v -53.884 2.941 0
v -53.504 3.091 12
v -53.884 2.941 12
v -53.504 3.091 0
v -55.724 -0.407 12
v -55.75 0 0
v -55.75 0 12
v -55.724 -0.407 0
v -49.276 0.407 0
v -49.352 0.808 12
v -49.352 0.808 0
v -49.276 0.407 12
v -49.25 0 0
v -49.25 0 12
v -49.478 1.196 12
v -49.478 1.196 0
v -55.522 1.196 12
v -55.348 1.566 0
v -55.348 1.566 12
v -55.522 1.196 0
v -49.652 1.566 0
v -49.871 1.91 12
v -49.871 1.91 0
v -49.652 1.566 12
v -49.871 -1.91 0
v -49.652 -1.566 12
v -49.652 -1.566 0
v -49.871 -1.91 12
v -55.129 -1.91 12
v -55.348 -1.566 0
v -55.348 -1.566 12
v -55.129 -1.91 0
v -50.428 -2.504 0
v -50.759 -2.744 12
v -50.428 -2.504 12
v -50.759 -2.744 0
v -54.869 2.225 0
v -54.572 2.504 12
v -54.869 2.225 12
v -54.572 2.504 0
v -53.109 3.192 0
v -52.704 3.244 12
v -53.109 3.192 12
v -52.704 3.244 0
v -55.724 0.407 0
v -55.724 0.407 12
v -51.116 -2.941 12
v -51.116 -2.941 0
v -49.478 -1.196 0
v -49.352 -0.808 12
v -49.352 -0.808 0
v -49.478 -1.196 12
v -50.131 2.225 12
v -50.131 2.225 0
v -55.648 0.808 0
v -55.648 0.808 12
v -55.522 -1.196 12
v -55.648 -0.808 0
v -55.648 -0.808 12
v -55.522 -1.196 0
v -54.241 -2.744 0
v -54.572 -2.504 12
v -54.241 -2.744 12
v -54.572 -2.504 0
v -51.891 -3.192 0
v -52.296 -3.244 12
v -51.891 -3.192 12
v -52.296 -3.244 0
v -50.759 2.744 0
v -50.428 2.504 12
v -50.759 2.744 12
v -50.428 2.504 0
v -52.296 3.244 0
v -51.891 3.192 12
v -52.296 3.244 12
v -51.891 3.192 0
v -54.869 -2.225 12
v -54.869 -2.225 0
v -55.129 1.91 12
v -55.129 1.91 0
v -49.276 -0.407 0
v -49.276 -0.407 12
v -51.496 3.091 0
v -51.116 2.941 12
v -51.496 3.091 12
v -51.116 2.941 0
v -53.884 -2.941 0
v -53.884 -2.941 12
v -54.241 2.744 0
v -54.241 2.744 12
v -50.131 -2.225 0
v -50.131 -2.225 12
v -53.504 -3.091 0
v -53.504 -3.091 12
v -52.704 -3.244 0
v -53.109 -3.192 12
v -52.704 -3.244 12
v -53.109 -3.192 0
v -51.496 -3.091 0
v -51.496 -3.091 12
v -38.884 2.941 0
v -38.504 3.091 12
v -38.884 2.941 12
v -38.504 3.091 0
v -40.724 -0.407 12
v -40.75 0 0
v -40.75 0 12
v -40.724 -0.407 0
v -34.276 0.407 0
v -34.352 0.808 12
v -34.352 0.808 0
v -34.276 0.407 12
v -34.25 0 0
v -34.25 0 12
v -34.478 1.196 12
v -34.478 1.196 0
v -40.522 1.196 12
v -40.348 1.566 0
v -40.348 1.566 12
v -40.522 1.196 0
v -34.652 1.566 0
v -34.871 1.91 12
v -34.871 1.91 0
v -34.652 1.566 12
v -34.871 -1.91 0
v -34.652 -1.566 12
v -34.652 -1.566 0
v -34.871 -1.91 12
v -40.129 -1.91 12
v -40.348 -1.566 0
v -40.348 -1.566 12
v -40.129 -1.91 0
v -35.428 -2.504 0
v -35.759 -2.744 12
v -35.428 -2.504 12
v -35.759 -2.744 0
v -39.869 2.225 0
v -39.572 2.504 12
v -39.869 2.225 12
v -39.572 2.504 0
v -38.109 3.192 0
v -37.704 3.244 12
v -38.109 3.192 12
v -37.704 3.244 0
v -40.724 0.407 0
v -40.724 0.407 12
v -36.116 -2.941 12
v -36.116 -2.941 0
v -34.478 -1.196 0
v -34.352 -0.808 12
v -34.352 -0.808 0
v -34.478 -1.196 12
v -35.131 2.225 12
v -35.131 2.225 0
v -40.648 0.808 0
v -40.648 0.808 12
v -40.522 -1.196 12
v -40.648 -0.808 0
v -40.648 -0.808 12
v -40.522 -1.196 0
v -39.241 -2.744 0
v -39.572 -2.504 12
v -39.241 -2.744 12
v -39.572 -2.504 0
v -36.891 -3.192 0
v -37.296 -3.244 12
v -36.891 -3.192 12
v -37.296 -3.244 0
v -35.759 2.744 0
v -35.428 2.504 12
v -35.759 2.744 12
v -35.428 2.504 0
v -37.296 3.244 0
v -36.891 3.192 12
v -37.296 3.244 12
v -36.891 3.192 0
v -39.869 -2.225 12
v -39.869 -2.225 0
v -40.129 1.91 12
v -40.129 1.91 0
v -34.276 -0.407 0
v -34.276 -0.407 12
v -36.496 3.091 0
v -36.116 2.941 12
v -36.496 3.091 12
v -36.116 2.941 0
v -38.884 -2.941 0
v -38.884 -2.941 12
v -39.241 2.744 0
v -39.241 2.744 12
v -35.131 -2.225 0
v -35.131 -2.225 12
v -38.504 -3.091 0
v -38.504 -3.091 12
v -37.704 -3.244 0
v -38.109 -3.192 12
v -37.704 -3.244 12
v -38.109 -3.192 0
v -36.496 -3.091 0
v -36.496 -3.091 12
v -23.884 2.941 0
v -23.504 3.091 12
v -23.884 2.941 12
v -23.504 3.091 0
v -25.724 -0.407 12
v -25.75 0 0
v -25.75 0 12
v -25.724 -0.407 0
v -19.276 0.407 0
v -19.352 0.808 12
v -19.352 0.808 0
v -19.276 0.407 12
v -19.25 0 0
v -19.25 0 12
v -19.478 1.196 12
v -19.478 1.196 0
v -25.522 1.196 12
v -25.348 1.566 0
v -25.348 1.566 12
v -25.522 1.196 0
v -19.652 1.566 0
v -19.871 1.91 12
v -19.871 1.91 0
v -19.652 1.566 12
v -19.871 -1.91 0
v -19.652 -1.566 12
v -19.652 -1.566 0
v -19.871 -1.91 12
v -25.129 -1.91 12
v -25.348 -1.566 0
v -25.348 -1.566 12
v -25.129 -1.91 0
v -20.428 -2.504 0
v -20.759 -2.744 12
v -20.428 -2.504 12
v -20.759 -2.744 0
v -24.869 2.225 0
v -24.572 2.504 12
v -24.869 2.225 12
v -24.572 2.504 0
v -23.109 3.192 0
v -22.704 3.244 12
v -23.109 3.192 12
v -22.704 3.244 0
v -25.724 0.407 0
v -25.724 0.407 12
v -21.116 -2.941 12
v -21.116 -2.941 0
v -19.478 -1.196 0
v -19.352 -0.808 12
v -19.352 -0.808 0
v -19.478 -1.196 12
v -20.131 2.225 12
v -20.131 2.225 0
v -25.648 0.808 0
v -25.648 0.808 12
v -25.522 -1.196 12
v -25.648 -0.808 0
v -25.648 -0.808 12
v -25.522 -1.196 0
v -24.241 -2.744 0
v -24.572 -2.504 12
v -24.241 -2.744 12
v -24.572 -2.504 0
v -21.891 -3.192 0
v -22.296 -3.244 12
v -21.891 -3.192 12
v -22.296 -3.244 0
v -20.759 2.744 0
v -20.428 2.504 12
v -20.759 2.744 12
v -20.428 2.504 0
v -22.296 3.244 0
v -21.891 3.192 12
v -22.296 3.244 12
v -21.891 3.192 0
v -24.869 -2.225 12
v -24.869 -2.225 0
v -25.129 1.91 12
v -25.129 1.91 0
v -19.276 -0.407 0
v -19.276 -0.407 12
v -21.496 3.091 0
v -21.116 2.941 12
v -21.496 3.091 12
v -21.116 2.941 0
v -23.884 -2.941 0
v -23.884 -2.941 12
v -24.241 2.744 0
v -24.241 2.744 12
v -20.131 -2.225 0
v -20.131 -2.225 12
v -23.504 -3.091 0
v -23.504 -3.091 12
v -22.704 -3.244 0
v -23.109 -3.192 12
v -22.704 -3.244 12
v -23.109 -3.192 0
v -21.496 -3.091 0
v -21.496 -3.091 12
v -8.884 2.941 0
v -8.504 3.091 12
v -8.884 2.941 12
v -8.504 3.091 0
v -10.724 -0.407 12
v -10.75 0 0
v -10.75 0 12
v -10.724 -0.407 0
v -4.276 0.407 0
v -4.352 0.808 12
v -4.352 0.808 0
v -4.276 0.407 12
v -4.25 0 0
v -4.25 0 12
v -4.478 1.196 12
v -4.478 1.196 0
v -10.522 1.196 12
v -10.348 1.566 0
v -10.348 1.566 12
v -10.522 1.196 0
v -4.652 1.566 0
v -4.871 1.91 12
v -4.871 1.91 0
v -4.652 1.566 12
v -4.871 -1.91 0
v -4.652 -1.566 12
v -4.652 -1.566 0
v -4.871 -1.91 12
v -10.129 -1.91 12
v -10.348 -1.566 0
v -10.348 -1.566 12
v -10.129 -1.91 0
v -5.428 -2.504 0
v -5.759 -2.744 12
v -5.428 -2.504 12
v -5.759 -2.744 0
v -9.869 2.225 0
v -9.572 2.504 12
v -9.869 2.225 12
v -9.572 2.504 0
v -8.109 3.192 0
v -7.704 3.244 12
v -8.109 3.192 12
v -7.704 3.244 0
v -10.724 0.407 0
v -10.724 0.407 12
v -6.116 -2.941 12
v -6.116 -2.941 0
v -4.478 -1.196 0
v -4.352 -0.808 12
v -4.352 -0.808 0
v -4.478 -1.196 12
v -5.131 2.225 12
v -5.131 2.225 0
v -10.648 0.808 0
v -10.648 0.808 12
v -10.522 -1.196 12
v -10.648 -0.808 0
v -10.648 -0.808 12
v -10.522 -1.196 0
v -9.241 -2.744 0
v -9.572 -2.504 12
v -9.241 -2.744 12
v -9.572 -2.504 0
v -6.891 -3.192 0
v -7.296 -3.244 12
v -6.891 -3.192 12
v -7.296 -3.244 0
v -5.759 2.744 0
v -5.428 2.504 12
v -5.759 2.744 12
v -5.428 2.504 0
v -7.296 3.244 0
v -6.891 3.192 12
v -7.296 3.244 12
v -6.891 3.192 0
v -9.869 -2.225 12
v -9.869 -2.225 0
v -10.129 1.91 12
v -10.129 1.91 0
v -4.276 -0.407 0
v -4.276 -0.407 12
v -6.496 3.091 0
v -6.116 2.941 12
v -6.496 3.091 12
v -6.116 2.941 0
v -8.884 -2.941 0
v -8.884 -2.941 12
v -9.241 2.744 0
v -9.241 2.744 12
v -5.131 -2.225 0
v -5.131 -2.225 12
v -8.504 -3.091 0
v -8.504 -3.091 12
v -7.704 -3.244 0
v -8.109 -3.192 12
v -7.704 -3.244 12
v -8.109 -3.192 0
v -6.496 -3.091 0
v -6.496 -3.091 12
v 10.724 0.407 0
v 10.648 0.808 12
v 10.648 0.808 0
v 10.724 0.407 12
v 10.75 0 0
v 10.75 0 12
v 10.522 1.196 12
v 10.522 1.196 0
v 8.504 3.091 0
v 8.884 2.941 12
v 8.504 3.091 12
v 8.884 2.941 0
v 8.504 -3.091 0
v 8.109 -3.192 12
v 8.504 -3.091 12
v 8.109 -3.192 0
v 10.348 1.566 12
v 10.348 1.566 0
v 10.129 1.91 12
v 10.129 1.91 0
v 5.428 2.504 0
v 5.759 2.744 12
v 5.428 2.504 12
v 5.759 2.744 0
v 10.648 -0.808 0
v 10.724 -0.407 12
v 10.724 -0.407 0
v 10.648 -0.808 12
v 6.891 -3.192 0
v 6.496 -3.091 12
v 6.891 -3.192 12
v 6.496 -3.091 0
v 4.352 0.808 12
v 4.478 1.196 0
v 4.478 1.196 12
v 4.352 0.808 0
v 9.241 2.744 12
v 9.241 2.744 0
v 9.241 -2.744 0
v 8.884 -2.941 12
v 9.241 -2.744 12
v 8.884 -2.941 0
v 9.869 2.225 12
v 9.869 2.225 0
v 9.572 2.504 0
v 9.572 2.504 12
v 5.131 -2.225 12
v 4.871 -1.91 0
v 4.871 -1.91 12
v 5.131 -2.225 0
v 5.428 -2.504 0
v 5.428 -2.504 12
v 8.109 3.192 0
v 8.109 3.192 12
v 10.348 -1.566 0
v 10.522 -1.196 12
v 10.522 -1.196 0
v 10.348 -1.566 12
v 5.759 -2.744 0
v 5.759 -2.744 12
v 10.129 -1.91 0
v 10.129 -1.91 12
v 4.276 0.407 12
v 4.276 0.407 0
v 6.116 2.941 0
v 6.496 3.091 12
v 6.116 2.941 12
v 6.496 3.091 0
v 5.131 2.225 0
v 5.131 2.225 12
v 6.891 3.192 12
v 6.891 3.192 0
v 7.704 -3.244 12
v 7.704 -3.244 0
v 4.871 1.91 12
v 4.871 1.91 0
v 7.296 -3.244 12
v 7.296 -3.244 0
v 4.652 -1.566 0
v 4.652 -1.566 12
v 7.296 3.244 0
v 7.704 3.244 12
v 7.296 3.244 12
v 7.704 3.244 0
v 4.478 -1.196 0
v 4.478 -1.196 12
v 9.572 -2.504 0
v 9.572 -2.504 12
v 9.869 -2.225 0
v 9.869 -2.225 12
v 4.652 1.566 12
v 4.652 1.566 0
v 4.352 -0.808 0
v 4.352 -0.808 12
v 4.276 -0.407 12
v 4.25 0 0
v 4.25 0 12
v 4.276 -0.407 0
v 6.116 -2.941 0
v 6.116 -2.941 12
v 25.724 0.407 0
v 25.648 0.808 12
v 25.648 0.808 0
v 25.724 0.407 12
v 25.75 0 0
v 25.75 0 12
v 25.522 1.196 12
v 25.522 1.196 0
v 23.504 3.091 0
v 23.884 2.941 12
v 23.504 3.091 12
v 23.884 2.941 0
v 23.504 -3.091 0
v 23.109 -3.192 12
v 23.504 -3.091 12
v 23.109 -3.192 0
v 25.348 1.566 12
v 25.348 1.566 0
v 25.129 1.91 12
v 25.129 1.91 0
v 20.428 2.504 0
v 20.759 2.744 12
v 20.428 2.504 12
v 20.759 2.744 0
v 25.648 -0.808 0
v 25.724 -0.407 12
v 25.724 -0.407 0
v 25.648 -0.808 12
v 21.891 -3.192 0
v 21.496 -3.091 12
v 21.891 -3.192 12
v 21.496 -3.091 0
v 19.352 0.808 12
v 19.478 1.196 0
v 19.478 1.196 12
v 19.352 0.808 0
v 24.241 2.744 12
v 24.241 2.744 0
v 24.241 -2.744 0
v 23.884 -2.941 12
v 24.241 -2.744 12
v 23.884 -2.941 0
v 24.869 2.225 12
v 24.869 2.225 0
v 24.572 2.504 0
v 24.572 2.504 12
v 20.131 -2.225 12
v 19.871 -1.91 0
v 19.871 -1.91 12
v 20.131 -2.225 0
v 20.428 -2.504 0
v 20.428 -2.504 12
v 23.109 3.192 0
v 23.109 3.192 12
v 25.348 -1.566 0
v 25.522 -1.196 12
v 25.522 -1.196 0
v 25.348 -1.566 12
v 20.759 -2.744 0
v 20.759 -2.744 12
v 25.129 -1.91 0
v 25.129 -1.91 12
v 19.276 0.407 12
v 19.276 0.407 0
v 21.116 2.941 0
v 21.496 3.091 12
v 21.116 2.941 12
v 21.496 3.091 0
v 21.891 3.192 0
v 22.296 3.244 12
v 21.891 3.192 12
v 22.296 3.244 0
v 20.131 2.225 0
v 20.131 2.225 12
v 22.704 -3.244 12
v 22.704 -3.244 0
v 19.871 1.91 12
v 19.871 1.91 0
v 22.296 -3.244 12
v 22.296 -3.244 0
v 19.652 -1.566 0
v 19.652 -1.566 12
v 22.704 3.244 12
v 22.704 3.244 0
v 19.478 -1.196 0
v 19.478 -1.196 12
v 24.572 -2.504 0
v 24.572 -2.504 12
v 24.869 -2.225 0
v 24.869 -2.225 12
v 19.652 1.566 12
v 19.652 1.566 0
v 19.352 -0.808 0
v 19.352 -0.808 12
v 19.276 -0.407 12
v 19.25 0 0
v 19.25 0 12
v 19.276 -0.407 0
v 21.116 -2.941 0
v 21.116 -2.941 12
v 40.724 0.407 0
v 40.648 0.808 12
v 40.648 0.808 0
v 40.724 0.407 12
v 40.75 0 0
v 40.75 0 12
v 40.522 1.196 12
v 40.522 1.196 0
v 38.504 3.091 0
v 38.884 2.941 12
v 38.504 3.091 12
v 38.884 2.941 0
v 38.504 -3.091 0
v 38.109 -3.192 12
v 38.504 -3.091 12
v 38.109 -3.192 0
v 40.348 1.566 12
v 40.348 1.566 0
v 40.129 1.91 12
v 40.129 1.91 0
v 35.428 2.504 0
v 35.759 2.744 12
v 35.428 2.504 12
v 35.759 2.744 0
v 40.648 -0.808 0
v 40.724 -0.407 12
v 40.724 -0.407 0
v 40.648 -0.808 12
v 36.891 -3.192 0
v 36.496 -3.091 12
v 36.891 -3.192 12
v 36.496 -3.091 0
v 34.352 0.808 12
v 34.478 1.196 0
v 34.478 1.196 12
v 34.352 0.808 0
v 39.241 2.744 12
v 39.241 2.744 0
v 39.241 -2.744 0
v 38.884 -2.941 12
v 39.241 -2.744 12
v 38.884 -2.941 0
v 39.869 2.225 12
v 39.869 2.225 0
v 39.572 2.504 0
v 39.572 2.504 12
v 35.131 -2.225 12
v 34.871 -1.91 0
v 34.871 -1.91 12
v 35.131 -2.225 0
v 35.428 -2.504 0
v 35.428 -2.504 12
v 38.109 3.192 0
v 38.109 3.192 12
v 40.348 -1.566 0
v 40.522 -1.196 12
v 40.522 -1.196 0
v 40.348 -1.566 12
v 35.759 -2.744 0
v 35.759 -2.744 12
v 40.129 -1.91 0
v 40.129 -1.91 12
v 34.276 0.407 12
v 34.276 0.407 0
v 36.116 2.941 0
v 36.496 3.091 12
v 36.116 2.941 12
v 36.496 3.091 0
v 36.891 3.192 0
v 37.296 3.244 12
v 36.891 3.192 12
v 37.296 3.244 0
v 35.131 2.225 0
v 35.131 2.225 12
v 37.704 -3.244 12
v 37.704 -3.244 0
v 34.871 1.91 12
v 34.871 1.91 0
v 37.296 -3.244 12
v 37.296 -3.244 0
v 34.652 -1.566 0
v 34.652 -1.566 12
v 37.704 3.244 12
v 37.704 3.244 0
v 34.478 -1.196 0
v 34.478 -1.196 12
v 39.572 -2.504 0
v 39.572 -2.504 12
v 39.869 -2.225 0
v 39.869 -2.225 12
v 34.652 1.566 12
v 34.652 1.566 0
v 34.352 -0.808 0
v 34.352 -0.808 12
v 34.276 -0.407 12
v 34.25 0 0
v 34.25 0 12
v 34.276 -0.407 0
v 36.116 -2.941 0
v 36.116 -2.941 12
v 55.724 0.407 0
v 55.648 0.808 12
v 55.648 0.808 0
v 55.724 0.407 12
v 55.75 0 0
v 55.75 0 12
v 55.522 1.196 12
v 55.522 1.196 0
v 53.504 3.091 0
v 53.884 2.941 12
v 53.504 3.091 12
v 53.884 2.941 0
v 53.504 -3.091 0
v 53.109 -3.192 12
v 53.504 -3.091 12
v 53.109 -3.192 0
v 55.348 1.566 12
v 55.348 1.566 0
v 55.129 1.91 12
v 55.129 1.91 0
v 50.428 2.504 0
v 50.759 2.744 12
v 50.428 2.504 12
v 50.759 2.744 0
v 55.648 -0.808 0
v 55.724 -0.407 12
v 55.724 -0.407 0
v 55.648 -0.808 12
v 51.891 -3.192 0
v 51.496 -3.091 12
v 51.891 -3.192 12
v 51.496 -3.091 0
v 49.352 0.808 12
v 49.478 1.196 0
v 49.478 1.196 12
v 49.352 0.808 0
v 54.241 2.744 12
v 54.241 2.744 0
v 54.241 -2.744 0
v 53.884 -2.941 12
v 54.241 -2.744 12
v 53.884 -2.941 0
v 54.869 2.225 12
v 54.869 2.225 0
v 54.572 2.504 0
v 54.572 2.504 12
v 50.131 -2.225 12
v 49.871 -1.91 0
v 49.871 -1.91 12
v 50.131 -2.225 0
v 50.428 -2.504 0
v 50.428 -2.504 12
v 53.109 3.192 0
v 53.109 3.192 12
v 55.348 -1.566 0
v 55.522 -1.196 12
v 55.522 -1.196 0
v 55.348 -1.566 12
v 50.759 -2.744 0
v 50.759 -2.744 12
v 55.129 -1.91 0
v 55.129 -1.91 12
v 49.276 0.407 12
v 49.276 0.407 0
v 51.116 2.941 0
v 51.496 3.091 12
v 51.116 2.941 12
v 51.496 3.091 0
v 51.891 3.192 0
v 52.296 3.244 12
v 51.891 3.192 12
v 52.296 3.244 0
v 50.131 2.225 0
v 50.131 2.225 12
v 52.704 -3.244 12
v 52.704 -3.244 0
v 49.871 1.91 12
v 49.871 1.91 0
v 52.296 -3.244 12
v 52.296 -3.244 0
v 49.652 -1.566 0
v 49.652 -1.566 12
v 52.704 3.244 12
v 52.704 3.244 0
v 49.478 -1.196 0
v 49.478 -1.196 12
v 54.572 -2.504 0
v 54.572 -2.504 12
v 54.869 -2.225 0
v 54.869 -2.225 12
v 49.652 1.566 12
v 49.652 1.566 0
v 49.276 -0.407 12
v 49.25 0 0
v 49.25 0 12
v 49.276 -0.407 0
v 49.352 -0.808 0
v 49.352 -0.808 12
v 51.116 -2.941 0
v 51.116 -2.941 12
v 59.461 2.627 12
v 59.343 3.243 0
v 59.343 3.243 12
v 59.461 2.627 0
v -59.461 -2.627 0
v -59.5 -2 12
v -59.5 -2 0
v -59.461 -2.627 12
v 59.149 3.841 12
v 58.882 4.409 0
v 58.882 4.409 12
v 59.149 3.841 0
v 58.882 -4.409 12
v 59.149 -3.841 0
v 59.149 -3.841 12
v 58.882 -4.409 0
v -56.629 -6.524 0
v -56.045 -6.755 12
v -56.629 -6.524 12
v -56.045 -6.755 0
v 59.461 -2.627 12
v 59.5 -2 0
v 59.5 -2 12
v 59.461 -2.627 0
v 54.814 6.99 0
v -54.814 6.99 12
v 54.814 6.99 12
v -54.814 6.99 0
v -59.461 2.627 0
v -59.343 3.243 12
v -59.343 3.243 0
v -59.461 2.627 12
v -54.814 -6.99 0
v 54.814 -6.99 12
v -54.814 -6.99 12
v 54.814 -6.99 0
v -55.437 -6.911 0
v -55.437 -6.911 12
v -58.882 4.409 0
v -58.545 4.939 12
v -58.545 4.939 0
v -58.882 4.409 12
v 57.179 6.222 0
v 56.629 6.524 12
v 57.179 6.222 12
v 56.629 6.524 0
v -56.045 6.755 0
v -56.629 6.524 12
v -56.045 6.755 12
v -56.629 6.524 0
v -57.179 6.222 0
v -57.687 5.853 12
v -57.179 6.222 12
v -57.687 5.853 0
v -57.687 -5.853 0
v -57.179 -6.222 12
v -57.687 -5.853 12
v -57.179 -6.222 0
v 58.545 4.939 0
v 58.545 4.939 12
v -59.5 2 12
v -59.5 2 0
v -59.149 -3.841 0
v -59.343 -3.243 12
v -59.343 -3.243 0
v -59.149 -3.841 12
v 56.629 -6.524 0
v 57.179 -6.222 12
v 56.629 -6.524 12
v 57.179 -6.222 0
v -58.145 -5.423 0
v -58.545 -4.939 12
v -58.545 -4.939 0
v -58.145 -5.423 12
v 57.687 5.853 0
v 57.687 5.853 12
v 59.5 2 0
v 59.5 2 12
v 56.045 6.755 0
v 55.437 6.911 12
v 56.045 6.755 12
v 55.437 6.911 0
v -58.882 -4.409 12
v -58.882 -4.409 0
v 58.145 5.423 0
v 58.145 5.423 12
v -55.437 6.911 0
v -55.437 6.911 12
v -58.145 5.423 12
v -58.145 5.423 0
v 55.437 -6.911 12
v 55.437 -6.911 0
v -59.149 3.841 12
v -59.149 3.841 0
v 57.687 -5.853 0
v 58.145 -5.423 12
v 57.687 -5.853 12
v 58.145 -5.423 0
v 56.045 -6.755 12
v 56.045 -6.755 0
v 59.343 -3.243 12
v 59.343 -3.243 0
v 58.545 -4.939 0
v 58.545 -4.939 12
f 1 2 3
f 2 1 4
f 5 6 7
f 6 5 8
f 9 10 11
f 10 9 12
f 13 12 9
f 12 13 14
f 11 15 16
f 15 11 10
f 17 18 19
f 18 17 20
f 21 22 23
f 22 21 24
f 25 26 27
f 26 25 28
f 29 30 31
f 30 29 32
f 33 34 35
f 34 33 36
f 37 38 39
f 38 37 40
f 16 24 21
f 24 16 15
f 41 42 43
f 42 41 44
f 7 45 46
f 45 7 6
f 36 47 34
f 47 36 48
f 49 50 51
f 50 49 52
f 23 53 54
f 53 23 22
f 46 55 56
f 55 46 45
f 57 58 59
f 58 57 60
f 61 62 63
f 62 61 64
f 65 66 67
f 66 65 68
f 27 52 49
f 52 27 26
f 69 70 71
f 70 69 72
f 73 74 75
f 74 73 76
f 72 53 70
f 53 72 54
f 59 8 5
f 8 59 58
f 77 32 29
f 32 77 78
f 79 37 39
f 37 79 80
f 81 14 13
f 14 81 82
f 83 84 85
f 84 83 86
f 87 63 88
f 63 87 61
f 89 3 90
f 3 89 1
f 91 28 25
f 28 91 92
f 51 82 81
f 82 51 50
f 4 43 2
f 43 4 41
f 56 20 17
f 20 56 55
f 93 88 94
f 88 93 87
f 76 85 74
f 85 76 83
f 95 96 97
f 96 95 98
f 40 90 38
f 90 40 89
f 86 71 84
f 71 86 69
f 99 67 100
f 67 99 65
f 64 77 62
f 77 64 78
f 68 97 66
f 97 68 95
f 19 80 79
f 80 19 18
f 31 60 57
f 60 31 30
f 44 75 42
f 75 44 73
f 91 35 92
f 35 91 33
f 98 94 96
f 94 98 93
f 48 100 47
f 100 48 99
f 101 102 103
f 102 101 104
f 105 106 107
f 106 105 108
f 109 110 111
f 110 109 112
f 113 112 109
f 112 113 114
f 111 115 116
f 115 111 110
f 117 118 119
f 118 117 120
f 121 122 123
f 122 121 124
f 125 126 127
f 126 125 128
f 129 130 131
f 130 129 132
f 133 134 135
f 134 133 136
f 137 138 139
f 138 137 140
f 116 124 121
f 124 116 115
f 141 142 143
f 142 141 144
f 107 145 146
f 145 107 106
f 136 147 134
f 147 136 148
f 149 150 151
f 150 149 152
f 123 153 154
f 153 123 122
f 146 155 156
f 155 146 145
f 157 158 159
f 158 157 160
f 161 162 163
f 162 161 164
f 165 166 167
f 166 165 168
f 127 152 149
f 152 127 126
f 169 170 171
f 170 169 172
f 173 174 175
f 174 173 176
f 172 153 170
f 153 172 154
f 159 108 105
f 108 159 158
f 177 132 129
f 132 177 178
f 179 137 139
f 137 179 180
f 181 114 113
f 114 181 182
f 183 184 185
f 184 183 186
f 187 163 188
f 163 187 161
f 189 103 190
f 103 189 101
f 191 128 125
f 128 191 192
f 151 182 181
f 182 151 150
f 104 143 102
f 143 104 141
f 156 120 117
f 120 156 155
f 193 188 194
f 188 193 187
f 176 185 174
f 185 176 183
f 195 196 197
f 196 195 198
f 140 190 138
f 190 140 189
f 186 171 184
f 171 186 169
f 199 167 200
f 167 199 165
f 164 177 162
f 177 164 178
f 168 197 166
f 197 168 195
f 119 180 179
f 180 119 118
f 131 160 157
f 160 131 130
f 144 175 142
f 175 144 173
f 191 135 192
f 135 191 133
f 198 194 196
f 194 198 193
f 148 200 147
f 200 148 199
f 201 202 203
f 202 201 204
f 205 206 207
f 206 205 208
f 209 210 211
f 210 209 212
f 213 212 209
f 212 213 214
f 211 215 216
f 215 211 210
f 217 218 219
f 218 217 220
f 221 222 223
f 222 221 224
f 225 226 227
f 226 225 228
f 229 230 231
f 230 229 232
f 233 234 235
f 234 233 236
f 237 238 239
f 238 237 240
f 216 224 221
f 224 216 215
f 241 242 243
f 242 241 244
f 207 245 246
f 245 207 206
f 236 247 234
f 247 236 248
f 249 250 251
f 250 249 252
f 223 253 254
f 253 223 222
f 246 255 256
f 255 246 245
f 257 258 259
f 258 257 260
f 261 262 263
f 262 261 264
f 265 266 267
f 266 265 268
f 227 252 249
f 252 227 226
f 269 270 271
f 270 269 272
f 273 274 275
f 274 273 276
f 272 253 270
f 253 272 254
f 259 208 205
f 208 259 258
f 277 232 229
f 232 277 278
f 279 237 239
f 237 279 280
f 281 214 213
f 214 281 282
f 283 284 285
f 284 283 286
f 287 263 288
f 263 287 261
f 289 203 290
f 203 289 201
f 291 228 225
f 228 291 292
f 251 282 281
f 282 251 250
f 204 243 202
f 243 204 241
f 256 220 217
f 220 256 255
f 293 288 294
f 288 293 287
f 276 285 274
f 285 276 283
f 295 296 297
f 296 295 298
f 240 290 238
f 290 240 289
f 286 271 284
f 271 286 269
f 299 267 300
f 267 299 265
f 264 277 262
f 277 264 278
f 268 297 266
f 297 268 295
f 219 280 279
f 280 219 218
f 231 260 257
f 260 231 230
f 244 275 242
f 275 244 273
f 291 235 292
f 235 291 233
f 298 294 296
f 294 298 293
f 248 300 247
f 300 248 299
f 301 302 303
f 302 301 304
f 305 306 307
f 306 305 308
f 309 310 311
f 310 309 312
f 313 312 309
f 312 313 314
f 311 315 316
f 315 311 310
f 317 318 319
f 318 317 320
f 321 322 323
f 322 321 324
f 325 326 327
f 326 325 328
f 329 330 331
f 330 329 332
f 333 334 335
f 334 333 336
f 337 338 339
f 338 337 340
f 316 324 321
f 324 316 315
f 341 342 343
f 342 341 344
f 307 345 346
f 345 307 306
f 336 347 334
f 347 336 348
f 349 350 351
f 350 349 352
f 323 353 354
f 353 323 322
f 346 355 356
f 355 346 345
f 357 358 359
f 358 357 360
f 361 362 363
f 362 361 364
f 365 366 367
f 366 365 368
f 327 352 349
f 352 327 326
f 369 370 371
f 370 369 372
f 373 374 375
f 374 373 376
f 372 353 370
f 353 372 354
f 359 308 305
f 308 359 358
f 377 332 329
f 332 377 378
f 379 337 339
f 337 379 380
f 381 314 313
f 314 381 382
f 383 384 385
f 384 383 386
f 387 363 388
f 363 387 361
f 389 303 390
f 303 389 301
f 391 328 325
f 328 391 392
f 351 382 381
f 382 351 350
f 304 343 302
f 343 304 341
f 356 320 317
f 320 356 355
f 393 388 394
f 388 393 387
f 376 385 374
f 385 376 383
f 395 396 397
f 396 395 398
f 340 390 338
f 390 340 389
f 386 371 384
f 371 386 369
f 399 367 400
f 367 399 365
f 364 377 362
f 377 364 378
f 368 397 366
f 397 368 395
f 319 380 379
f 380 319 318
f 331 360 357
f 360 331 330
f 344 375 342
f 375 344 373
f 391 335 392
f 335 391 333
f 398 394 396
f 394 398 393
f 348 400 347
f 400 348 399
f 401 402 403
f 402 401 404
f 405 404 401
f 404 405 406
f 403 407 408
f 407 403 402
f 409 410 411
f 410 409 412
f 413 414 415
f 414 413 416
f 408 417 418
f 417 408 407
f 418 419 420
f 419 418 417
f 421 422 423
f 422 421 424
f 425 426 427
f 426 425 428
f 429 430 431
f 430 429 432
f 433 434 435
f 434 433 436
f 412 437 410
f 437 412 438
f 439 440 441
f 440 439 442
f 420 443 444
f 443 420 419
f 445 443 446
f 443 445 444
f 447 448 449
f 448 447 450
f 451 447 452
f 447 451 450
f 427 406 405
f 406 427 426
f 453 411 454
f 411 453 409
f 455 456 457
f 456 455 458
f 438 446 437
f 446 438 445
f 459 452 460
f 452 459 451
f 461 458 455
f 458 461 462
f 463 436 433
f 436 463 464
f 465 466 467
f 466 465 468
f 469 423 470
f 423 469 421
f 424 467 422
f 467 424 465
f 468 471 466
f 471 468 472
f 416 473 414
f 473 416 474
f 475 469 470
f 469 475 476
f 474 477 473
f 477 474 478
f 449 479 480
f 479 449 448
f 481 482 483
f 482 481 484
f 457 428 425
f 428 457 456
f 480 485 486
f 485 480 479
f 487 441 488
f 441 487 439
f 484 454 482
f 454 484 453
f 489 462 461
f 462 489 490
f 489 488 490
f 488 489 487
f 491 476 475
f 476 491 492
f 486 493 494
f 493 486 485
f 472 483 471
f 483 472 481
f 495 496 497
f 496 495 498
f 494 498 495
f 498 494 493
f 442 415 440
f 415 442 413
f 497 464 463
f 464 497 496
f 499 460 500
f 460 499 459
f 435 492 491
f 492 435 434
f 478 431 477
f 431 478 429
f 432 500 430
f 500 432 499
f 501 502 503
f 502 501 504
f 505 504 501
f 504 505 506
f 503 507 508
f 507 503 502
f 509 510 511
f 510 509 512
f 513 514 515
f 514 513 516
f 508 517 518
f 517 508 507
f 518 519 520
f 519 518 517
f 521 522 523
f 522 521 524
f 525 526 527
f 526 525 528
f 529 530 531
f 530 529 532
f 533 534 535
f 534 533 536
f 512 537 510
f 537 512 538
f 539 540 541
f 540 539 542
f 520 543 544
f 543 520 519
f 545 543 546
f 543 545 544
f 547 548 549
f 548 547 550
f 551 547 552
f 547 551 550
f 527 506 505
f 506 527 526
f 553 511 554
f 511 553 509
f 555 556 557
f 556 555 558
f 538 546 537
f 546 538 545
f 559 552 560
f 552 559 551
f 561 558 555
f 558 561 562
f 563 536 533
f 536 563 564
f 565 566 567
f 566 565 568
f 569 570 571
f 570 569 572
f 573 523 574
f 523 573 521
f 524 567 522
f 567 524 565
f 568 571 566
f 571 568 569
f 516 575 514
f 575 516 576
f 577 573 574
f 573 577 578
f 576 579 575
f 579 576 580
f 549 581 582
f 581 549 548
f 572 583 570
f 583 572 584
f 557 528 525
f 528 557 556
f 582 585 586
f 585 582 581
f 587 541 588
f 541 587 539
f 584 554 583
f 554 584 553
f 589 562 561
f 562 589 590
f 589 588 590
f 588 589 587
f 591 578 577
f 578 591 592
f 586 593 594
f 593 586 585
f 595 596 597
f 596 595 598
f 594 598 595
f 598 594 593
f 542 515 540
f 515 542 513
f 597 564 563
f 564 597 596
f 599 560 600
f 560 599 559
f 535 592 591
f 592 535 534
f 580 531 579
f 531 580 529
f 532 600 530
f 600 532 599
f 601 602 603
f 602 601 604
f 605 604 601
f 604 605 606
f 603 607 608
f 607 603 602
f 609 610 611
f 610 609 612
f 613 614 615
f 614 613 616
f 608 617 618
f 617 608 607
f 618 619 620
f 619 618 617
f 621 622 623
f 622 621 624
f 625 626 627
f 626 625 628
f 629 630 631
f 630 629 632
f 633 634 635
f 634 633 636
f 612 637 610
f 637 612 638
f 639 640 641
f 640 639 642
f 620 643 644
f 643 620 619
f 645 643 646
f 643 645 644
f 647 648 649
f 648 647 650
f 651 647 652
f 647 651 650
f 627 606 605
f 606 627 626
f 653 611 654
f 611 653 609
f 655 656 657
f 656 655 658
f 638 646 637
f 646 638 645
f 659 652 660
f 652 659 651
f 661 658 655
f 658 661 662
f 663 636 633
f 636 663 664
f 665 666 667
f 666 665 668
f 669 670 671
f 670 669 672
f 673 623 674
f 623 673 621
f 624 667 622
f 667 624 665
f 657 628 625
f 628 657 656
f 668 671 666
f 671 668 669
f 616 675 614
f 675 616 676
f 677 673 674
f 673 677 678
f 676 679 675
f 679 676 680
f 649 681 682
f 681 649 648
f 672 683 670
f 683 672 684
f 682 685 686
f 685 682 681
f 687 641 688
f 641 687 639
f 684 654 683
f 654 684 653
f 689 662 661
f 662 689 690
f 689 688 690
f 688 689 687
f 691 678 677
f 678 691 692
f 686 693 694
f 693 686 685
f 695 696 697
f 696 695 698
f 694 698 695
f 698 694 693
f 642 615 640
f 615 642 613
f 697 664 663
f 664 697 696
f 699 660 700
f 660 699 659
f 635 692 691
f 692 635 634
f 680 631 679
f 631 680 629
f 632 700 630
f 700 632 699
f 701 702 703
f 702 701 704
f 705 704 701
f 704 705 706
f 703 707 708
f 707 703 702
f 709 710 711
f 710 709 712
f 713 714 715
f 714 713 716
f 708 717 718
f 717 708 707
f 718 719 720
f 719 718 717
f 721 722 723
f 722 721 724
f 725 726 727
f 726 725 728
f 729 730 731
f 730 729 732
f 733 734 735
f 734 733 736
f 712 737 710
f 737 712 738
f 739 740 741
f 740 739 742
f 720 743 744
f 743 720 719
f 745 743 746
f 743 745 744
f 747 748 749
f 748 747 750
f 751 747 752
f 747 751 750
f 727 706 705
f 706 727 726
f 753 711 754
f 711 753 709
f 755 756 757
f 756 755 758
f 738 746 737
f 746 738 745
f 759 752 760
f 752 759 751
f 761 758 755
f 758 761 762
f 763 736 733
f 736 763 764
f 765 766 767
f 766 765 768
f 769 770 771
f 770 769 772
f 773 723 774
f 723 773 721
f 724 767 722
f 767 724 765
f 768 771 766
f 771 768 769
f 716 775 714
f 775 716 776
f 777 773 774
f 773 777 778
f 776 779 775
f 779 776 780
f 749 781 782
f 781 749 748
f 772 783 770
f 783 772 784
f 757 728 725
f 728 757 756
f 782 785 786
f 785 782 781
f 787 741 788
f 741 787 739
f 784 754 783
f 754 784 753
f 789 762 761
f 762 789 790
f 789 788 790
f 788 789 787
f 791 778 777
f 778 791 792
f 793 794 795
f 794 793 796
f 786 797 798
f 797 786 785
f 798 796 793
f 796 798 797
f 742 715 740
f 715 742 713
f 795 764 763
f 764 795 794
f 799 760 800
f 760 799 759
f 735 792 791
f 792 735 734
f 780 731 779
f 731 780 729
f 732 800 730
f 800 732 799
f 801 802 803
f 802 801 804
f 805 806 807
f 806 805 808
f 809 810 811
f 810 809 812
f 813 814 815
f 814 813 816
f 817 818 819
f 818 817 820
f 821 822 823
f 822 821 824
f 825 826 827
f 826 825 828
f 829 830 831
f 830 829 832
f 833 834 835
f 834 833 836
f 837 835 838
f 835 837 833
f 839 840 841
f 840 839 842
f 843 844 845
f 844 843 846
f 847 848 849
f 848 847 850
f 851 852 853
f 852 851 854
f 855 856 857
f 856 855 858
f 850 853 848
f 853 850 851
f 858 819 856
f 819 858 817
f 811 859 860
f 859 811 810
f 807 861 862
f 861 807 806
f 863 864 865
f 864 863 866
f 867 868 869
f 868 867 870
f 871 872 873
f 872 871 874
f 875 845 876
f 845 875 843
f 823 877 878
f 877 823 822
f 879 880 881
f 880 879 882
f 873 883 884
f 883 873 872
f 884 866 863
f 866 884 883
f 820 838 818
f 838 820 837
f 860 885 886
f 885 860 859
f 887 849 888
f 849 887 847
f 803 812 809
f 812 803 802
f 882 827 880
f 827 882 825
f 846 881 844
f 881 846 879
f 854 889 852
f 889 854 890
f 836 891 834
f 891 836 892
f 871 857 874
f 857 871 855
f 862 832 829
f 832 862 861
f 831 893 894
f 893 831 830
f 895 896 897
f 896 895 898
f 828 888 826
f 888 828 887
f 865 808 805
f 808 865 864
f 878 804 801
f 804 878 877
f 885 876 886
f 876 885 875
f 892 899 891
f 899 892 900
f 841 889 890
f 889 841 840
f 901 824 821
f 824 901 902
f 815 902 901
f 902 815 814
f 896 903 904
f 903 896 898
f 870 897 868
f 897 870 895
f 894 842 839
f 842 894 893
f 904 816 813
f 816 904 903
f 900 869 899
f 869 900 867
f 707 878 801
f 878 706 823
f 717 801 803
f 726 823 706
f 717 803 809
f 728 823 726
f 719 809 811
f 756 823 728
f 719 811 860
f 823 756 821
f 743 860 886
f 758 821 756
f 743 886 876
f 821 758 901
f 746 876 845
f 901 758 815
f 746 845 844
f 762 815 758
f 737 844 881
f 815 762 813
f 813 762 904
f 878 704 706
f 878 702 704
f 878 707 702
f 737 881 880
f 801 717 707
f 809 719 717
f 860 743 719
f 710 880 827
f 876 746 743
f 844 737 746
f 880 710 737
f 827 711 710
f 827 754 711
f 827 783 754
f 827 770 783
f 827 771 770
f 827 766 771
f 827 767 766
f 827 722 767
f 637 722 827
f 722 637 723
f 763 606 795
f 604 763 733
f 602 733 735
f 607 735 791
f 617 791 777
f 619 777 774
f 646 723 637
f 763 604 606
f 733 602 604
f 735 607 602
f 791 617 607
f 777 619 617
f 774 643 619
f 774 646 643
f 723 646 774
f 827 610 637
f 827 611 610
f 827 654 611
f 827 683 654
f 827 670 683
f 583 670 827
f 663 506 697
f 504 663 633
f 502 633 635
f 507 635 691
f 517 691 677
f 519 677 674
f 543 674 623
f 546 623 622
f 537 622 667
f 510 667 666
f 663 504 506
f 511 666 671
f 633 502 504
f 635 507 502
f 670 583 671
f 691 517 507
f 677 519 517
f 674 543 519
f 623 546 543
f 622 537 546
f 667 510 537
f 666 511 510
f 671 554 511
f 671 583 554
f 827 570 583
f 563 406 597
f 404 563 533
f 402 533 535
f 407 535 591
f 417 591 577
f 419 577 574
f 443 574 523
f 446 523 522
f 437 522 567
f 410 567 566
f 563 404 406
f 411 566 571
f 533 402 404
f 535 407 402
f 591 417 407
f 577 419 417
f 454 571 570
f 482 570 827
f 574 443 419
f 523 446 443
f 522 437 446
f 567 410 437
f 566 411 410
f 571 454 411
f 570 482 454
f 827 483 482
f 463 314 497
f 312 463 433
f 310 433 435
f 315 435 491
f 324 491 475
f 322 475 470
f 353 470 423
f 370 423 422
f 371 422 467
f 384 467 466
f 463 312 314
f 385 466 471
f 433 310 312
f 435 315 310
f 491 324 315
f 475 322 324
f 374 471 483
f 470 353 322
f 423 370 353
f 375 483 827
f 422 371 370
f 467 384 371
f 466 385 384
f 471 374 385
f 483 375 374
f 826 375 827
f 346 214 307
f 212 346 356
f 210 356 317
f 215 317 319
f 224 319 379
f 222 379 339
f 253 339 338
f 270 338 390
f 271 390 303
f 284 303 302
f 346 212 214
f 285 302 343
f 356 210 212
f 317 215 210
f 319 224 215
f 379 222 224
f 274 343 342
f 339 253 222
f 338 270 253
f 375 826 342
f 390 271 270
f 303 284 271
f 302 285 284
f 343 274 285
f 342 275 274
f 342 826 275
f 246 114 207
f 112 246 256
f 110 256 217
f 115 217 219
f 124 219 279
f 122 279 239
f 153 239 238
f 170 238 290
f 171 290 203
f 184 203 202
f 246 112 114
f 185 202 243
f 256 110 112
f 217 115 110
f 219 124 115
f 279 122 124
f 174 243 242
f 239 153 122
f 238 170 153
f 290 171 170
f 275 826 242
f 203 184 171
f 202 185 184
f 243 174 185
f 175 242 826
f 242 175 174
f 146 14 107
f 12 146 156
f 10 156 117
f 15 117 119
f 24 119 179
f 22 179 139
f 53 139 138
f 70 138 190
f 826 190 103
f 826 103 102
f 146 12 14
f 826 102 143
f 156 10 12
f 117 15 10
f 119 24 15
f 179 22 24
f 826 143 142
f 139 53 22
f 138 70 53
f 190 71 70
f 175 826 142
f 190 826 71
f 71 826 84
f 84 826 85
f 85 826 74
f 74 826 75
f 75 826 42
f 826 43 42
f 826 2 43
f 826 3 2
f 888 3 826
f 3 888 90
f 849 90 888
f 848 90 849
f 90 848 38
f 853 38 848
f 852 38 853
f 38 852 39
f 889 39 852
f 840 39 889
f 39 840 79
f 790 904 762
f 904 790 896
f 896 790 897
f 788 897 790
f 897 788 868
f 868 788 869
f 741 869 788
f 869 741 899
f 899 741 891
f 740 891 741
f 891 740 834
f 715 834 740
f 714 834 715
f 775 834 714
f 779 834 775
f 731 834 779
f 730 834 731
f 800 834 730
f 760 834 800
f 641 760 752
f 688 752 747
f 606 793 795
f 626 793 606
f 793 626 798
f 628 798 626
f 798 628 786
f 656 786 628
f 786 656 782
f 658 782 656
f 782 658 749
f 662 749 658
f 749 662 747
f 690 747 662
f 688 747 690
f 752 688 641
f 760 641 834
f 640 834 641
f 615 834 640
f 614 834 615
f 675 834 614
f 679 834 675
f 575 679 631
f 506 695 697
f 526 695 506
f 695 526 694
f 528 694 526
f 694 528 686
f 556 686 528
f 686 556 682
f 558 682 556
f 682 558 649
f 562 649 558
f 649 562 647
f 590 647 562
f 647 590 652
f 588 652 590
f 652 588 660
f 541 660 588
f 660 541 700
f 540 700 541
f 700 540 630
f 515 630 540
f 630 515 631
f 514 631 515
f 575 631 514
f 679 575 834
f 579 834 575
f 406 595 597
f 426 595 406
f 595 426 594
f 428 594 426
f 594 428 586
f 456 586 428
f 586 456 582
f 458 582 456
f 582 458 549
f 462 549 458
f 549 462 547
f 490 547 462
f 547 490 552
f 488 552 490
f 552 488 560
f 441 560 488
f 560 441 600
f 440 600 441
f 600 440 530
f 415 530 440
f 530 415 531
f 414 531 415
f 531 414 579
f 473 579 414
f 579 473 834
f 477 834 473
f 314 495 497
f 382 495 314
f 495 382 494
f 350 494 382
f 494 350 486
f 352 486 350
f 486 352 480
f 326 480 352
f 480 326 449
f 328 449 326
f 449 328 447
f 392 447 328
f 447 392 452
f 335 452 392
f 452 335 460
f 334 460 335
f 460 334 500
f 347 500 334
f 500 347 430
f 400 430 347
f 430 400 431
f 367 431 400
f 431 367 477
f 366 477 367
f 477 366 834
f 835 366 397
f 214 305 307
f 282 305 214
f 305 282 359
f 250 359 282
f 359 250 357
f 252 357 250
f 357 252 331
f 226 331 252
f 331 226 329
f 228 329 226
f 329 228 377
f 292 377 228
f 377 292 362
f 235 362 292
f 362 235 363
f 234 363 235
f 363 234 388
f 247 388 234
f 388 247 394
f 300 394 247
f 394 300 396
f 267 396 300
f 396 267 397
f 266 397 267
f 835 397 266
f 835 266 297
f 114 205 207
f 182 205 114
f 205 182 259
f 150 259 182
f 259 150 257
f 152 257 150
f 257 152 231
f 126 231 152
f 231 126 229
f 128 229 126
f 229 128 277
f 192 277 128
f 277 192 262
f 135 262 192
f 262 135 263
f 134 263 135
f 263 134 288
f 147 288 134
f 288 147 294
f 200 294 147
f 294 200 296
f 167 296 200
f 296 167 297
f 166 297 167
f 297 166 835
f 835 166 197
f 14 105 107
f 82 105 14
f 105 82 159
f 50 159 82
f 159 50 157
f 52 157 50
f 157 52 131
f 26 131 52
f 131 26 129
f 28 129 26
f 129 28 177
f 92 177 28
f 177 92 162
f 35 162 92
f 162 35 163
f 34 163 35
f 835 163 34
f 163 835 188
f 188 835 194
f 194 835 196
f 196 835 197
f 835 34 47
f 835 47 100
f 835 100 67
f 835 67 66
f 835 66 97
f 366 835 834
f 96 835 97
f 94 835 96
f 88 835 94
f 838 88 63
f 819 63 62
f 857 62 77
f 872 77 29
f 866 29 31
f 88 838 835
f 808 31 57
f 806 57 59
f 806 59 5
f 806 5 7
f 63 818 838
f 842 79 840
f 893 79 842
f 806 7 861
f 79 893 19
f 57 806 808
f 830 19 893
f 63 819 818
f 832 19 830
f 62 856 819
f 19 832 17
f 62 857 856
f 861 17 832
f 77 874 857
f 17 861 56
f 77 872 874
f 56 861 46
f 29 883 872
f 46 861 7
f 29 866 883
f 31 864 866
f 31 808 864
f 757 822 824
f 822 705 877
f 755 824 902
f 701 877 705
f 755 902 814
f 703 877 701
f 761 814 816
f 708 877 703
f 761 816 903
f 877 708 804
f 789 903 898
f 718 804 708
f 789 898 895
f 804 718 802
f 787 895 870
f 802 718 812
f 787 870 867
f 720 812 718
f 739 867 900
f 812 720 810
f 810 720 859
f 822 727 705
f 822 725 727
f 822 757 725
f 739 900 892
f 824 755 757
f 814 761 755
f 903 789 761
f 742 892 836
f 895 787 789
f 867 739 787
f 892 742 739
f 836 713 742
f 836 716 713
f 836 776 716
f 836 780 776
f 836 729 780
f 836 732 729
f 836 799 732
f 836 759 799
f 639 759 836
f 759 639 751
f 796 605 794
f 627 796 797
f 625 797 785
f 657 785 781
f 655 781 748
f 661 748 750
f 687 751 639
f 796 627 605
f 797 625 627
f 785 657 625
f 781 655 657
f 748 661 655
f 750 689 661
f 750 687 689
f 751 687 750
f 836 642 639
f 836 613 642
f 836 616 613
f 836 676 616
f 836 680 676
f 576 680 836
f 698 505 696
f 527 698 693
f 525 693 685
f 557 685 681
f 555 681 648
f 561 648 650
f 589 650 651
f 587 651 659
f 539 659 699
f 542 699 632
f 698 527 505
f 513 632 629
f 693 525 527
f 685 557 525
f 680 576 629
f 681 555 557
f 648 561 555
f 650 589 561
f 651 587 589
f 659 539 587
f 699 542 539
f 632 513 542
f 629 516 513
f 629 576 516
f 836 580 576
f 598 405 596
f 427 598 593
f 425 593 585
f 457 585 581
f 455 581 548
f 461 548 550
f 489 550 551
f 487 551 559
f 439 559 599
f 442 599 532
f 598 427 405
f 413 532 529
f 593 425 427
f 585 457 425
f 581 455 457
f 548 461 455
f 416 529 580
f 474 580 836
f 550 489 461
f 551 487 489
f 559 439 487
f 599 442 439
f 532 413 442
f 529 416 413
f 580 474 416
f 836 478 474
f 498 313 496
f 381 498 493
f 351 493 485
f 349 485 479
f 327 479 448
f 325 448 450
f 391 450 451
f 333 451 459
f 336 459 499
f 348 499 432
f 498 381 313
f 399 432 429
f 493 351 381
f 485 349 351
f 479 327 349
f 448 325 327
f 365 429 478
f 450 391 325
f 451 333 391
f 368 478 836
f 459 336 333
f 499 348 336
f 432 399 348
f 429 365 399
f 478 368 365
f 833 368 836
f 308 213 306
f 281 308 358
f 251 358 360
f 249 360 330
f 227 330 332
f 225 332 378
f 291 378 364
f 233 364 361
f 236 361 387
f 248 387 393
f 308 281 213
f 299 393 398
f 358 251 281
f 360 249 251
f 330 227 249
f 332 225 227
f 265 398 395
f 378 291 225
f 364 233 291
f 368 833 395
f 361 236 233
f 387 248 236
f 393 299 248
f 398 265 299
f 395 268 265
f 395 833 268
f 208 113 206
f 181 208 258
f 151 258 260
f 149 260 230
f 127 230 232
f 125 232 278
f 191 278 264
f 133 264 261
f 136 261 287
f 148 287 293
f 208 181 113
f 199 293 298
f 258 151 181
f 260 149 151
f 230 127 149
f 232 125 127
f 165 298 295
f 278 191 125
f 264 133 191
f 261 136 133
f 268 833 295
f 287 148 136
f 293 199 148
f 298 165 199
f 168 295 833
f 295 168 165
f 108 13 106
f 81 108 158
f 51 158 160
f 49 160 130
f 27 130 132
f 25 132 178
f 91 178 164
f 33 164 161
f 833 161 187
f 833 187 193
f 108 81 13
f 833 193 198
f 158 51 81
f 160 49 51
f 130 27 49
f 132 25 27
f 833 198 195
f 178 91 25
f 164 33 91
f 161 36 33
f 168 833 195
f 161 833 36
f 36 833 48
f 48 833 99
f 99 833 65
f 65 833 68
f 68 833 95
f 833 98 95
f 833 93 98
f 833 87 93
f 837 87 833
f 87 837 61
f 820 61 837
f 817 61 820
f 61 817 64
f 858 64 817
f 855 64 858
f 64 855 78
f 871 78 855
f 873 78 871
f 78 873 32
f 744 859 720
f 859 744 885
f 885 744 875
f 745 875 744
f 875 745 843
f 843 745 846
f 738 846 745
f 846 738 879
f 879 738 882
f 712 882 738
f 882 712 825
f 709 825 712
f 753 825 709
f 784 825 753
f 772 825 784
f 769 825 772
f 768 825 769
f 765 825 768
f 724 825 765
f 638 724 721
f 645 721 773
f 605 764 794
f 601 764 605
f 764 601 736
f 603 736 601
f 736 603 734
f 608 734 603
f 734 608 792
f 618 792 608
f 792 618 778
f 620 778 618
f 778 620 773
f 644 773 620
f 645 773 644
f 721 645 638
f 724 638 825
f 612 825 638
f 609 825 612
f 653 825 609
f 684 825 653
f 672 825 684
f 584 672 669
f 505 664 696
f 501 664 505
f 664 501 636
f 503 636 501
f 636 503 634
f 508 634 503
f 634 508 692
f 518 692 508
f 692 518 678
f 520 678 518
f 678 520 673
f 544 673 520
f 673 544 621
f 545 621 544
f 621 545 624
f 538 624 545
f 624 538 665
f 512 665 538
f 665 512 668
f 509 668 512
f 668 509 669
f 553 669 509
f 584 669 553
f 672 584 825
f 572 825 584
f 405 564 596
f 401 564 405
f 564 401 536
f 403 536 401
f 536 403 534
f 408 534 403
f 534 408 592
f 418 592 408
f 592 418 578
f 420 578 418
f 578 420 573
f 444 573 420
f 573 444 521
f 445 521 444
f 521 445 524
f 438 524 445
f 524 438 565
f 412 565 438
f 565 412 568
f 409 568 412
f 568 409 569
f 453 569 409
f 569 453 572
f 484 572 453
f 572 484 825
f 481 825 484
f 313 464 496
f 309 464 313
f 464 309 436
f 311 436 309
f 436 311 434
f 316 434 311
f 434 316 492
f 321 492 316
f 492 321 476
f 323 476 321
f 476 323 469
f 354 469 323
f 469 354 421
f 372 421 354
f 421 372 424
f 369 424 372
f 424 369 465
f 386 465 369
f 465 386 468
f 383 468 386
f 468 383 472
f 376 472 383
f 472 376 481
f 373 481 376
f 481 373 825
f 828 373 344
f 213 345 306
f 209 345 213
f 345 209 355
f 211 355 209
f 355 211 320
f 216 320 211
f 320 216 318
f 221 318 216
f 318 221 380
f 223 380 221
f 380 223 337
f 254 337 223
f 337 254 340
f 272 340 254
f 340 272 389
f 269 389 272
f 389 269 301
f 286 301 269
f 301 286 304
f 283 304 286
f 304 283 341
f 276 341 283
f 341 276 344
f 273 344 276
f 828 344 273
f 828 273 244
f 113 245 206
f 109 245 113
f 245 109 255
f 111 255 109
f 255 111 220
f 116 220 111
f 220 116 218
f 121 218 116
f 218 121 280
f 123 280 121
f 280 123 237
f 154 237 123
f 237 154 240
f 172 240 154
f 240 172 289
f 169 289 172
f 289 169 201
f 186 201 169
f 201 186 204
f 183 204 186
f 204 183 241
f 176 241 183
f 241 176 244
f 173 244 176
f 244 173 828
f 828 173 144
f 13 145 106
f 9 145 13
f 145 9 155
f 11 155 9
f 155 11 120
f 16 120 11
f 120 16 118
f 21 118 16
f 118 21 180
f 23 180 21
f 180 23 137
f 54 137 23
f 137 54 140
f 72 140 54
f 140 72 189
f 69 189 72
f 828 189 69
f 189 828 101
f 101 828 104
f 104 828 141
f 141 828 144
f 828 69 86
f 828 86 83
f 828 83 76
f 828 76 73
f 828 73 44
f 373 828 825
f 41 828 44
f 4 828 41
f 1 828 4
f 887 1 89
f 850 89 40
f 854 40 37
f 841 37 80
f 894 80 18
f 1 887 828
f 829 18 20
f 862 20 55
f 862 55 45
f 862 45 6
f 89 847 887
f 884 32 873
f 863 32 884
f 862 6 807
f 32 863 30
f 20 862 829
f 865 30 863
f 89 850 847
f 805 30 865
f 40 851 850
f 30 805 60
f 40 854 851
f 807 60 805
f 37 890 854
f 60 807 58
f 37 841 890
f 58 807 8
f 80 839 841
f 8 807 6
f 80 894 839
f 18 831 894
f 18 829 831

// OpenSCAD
$fn = 50;


difference() {
	union() {
		hull() {
			translate(v = [-54.5000000000, 2.0000000000, 0]) {
				cylinder(h = 12, r = 5);
			}
			translate(v = [54.5000000000, 2.0000000000, 0]) {
				cylinder(h = 12, r = 5);
			}
			translate(v = [-54.5000000000, -2.0000000000, 0]) {
				cylinder(h = 12, r = 5);
			}
			translate(v = [54.5000000000, -2.0000000000, 0]) {
				cylinder(h = 12, r = 5);
			}
		}
	}
	union() {
		translate(v = [-52.5000000000, 0.0000000000, -100.0000000000]) {
			cylinder(h = 200, r = 3.2500000000);
		}
		translate(v = [-37.5000000000, 0.0000000000, -100.0000000000]) {
			cylinder(h = 200, r = 3.2500000000);
		}
		translate(v = [-22.5000000000, 0.0000000000, -100.0000000000]) {
			cylinder(h = 200, r = 3.2500000000);
		}
		translate(v = [-7.5000000000, 0.0000000000, -100.0000000000]) {
			cylinder(h = 200, r = 3.2500000000);
		}
		translate(v = [7.5000000000, 0.0000000000, -100.0000000000]) {
			cylinder(h = 200, r = 3.2500000000);
		}
		translate(v = [22.5000000000, 0.0000000000, -100.0000000000]) {
			cylinder(h = 200, r = 3.2500000000);
		}
		translate(v = [37.5000000000, 0.0000000000, -100.0000000000]) {
			cylinder(h = 200, r = 3.2500000000);
		}
		translate(v = [52.5000000000, 0.0000000000, -100.0000000000]) {
			cylinder(h = 200, r = 3.2500000000);
		}
	}
}
